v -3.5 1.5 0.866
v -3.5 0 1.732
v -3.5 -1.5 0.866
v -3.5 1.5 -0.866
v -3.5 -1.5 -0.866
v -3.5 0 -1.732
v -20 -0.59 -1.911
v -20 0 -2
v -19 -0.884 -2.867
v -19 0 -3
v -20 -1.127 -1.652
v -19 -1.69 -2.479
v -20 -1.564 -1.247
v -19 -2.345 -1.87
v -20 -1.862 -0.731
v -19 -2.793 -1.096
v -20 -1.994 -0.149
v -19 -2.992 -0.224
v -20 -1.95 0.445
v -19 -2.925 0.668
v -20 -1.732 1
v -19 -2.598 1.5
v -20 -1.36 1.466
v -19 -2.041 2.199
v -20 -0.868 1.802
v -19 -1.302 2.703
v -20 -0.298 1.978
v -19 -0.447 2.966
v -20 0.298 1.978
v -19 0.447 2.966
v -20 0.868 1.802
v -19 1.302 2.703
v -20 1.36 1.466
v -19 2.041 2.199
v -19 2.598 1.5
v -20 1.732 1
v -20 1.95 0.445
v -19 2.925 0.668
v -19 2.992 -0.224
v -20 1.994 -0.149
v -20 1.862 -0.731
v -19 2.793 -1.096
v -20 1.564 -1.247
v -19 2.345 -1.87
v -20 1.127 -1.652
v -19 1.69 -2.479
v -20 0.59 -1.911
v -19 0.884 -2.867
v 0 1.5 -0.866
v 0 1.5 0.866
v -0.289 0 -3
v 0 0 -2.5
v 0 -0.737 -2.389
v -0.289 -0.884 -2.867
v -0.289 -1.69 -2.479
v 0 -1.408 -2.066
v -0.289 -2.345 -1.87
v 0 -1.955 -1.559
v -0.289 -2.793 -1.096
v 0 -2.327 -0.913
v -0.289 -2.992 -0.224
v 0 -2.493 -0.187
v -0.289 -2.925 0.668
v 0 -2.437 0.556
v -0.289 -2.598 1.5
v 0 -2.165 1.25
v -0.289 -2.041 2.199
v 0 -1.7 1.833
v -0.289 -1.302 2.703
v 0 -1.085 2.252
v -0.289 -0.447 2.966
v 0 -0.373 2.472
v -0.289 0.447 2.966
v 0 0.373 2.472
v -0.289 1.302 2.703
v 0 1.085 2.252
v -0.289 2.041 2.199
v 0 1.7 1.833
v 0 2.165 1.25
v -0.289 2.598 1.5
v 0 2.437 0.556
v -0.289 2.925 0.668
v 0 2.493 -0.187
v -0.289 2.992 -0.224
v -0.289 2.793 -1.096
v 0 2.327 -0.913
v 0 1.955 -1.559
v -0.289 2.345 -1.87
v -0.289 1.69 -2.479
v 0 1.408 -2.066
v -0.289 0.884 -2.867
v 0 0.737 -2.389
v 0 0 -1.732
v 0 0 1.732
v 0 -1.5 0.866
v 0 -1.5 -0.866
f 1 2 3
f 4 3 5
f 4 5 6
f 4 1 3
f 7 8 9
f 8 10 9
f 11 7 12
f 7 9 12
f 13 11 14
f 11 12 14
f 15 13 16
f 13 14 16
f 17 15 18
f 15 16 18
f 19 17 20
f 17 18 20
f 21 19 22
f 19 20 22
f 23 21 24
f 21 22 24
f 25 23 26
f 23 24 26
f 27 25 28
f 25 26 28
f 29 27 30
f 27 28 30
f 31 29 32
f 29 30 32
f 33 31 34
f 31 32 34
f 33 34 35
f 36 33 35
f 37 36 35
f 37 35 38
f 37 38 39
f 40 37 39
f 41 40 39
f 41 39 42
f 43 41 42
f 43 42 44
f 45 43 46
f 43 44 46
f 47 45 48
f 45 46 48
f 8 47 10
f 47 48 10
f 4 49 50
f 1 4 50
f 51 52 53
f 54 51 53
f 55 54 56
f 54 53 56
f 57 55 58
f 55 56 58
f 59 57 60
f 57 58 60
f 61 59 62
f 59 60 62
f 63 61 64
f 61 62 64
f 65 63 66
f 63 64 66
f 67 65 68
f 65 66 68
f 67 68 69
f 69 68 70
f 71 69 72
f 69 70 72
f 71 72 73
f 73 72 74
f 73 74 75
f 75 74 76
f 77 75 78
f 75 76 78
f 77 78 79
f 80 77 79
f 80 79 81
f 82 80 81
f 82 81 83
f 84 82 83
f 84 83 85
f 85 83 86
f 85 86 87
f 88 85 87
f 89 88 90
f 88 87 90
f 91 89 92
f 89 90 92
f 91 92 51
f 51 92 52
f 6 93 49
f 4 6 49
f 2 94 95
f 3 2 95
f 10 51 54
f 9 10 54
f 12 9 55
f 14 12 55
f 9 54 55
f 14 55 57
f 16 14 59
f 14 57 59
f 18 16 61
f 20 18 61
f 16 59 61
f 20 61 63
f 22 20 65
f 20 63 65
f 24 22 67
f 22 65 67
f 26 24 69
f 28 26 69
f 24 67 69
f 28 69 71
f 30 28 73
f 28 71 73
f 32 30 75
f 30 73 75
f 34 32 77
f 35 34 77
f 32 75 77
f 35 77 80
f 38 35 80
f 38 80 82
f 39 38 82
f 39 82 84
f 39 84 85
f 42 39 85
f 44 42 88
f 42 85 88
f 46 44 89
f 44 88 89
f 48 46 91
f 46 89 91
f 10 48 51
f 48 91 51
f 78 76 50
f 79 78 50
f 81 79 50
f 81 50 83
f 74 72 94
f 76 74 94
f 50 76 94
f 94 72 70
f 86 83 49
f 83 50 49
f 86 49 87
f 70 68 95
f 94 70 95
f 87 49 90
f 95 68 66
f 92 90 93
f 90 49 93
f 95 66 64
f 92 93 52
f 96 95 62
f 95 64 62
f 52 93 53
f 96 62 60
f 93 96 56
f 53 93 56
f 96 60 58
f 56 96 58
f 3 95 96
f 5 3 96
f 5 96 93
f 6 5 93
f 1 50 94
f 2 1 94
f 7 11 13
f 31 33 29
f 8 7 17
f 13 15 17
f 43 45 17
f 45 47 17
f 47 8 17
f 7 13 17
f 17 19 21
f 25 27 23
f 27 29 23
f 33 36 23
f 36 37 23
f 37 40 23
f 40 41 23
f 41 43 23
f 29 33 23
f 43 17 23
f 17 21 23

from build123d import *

# Parameters (mm, degrees)
CUT_EXTRUDE1_DEPTH = 3.5
CHAMFER1_SIZE      = 0.288675135
CHAMFER1_SIZE2     = 0.5


with BuildPart() as part:
    # Sketch1 → Revolve1 (revolve)
    with BuildSketch(Plane.XY, mode=Mode.PRIVATE) as revolve1_sk:
        Polygon((-20, 2), (-19, 3), (0, 3), (0, 0), (-20, 0), align=None)
    revolve(revolve1_sk.sketch.rotate(Axis((0, 0, 0), (-1, 0, 0)), 90), axis=Axis((0, 0, 0), (-1, 0, 0)))

    # Sketch2 → Cut-Extrude1 (cut)
    with BuildSketch(Plane(origin=(0, 0, 0), x_dir=(0, 0, -1), z_dir=(1, 0, 0))):
        Polygon((1.732050808, 0), (0.866025404, 1.5), (-0.866025404, 1.5), (-1.732050808, 0), (-0.866025404, -1.5), (0.866025404, -1.5), align=None)
    extrude(amount=-CUT_EXTRUDE1_DEPTH, mode=Mode.SUBTRACT)

    # Chamfer1
    chamfer1_edges = [part.edges().sort_by_distance(p)[0] for p in [
        (0, 0, 3),
    ]]
    chamfer1_side = [part.faces().sort_by_distance(p)[0] for p in [
        (-9.5, 0, 3),
    ]]
    chamfer(chamfer1_edges, length=CHAMFER1_SIZE, length2=CHAMFER1_SIZE2, reference=chamfer1_side[0])


solid = part.part
